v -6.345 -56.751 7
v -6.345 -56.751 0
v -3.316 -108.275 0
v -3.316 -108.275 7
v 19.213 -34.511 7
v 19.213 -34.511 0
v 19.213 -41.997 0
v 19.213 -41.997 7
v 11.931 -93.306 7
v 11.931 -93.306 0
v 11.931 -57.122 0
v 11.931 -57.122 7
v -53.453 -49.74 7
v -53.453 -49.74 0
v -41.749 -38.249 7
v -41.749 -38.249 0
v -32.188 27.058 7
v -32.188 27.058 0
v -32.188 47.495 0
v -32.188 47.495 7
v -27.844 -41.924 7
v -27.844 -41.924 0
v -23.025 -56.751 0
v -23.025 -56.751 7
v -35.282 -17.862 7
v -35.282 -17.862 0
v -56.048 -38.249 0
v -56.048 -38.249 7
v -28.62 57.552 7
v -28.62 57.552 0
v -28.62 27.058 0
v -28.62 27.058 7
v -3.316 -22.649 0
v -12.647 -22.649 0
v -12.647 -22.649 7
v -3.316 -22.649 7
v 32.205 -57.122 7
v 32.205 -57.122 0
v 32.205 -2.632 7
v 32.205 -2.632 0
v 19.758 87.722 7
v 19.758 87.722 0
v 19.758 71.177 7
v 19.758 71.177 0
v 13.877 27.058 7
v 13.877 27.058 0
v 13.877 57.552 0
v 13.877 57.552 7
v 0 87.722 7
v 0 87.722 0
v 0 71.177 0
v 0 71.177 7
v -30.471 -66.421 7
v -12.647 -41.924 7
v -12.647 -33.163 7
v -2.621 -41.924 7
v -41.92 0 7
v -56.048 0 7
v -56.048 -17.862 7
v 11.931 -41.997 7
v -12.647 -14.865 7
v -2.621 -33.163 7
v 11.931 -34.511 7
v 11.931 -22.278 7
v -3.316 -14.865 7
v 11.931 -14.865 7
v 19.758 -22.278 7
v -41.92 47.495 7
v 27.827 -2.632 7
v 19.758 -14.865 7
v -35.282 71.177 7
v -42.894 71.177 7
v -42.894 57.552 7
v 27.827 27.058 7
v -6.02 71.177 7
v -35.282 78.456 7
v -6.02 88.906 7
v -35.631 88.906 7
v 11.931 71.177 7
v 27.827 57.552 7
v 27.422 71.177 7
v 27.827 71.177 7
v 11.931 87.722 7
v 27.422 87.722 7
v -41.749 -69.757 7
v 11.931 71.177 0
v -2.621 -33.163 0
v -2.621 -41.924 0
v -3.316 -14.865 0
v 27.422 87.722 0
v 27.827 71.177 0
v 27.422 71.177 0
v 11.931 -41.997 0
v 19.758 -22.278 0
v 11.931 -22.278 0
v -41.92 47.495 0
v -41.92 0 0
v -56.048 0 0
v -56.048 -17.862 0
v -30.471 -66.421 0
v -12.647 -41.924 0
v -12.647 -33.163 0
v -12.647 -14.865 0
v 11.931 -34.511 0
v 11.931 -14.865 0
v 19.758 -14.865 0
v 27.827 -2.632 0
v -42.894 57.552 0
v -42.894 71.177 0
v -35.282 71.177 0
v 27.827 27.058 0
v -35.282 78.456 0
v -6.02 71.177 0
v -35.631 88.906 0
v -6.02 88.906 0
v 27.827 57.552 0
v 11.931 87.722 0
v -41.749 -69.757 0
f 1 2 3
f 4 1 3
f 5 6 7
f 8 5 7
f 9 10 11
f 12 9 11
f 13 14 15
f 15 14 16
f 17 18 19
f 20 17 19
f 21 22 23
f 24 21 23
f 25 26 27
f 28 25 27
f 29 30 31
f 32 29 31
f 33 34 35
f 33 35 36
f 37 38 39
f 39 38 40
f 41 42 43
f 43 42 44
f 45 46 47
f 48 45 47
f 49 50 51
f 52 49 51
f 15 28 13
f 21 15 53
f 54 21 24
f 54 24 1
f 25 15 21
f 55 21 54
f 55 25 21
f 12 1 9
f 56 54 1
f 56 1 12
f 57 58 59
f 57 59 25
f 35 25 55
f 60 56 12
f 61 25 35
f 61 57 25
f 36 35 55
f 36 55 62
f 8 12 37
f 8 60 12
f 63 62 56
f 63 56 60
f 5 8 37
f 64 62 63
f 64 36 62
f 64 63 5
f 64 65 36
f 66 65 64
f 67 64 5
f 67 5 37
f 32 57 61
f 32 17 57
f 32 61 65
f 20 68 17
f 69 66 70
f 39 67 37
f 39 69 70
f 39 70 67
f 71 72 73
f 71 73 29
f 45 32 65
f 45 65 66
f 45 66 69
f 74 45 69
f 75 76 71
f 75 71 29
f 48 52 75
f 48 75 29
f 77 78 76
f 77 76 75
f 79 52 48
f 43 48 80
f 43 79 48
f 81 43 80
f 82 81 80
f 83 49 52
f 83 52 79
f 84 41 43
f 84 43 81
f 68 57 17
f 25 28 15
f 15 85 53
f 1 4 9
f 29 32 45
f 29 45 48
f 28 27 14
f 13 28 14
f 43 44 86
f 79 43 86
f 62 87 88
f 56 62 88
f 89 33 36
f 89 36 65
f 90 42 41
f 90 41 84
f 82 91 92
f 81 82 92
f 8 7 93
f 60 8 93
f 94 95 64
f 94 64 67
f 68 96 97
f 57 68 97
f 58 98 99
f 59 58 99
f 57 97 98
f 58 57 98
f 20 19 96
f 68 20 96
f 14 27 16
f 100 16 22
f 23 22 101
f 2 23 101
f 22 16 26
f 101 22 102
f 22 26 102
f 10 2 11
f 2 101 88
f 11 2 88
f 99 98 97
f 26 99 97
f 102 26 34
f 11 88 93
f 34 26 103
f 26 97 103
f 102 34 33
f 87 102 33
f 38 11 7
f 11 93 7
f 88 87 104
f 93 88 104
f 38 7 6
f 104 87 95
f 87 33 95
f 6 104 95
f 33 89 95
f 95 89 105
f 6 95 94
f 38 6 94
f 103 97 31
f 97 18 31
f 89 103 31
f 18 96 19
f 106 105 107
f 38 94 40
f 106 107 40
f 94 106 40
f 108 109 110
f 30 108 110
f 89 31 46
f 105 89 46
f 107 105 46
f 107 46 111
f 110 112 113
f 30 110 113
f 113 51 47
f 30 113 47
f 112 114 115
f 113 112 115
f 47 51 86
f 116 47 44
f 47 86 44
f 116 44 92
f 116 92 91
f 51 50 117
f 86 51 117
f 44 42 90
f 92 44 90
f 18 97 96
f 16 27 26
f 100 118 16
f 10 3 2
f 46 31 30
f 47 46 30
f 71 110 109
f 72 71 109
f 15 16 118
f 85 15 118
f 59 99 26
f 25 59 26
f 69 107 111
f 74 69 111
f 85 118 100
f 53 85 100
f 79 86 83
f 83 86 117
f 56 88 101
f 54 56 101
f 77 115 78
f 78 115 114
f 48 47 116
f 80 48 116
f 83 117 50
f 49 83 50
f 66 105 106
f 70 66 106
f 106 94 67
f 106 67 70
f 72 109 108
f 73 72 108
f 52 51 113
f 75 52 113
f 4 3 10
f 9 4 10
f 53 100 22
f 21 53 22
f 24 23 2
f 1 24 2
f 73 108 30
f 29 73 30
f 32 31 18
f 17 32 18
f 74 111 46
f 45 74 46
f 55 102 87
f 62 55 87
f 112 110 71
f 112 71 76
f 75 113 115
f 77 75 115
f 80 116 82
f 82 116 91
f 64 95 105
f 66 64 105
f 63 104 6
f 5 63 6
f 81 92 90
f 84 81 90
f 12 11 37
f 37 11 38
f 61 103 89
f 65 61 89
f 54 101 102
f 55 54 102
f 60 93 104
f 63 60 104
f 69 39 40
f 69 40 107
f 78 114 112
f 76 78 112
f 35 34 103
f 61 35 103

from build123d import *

# Parameters (mm, degrees)
F1_W     = 9.3304801267
F1_H     = 7.7842138708
F1_W_2   = 7.8273694962
F1_H_2   = 7.4135381728
F1_W_3   = 29.2622358538
F1_H_3   = 7.2785243392
F1_W_4   = 7.6639167964
F1_H_4   = 5.8850795031
F1_H_5   = 10.659635067
F2_DEPTH = 7


# Not quite as in the source:
# - a feature names something its author has since deleted; it is built from what else it names


with BuildPart() as f2:
    # F1 (on Top) → F2 (new body)
    with BuildSketch(Plane.XY):
        Polygon((-41.9203750789, 47.4954210222), (-41.9203750789, 16.0942748189), (-3.3160478342, 16.0942748189), (-3.3160478342, 27.0578376949), (-14.6702602506, 27.0578376949), (-14.6702602506, 34.84358266), (-3.3160478342, 34.84358266), (-3.3160478342, 47.4954210222), (-14.6702602506, 47.4954210222), (-14.6702602506, 57.5520098209), (0, 57.5520098209), (0, 16.0942748189), (27.8269369155, 16.0942748189), (27.8269369155, 18.2988718152), (27.8269369155, 27.0578376949), (13.8774756342, 27.0578376949), (13.8774756342, 57.5520098209), (27.8269369155, 57.5520098209), (27.8269369155, 71.1770653725), (27.4223256856, 71.1770653725), (19.7584088892, 71.1770653725), (11.9310393929, 71.1770653725), (11.9310393929, 87.7217799425), (0, 87.7217799425), (0, 71.1770653725), (-6.0202269815, 71.1770653725), (-35.2824628353, 71.1770653725), (-42.8935922682, 71.1770653725), (-42.8935922682, 57.5520098209), (-28.6197233945, 57.5520098209), (-28.6197233945, 27.0578376949), (-32.1881920099, 27.0578376949), (-32.1881920099, 47.4954210222), align=None)
        Polygon((-3.3160478342, 16.0942748189), (-41.9203750789, 16.0942748189), (-41.9203750789, 0), (-3.3160478342, 0), (-3.3160478342, 12.5654535368), align=None)
        Polygon((-3.3160478342, 27.0578376949), (-3.3160478342, 16.0942748189), (-3.3160478342, 12.5654535368), (11.9310393929, 12.5654535368), (11.9310393929, -2.6322980411), (27.8269369155, -2.6322980411), (27.8269369155, 16.0942748189), (0, 16.0942748189), (0, 57.5520098209), (-14.6702602506, 57.5520098209), (-14.6702602506, 47.4954210222), (-3.3160478342, 47.4954210222), (-3.3160478342, 34.84358266), (-14.6702602506, 34.84358266), (-14.6702602506, 27.0578376949), align=None)
        Polygon((-3.3160478342, 0), (-41.9203750789, 0), (-56.0475625098, 0), (-56.0475625098, -17.8618896753), (-35.2824628353, -17.8618896753), (-56.0475625098, -38.2491163909), (-53.4528233111, -49.7401021421), (-41.7488545561, -38.2491163909), (-41.7488545561, -69.7566494346), (-30.4708592594, -66.4205625653), (-27.8442800045, -41.9240482152), (-23.0254810303, -56.7511208355), (-6.3450210728, -56.7511208355), (-3.3160478342, -108.2752048969), (11.9310393929, -93.3055765817), (11.9310393929, -57.1217983961), (32.2053730488, -57.1217983961), (32.2053730488, -2.6322980411), (27.8269369155, -2.6322980411), (11.9310393929, -2.6322980411), (11.9310393929, 12.5654535368), (-3.3160478342, 12.5654535368), align=None)
        Polygon((-12.6465279609, -38.2491163909), (-12.6465279609, -34.5105081797), (-12.6465279609, -33.1628471613), (-2.621053718, -33.1628471613), (-2.621053718, -41.9242307544), (-12.6465279609, -41.9242307544), align=None, mode=Mode.SUBTRACT)
        with Locations((-7.9812878976, -18.7567416579)):
            Rectangle(F1_W, F1_H, mode=Mode.SUBTRACT)
        Polygon((11.9310393929, -41.9240482152), (11.9310393929, -38.2491163909), (11.9310393929, -34.5105081797), (19.2130599171, -34.5105081797), (19.2130599171, -41.9973358512), (11.9310393929, -41.9973358512), align=None, mode=Mode.SUBTRACT)
        with Locations((15.8447241411, -18.5714038089)):
            Rectangle(F1_W_2, F1_H_2, mode=Mode.SUBTRACT)
        with Locations((-20.6513449084, 74.8163275421)):
            Rectangle(F1_W_3, F1_H_3)
        Polygon((-35.6308221817, 88.9063850045), (-35.2824628353, 78.4555897117), (-6.0202269815, 78.4555897117), (-6.0202269815, 88.9063850045), align=None)
        with Locations((23.5903672874, 74.119605124)):
            Rectangle(F1_W_4, F1_H_4)
        with Locations((23.5903672874, 82.391962409)):
            Rectangle(F1_W_4, F1_H_5)
    extrude(amount=F2_DEPTH)


solid = f2.part
